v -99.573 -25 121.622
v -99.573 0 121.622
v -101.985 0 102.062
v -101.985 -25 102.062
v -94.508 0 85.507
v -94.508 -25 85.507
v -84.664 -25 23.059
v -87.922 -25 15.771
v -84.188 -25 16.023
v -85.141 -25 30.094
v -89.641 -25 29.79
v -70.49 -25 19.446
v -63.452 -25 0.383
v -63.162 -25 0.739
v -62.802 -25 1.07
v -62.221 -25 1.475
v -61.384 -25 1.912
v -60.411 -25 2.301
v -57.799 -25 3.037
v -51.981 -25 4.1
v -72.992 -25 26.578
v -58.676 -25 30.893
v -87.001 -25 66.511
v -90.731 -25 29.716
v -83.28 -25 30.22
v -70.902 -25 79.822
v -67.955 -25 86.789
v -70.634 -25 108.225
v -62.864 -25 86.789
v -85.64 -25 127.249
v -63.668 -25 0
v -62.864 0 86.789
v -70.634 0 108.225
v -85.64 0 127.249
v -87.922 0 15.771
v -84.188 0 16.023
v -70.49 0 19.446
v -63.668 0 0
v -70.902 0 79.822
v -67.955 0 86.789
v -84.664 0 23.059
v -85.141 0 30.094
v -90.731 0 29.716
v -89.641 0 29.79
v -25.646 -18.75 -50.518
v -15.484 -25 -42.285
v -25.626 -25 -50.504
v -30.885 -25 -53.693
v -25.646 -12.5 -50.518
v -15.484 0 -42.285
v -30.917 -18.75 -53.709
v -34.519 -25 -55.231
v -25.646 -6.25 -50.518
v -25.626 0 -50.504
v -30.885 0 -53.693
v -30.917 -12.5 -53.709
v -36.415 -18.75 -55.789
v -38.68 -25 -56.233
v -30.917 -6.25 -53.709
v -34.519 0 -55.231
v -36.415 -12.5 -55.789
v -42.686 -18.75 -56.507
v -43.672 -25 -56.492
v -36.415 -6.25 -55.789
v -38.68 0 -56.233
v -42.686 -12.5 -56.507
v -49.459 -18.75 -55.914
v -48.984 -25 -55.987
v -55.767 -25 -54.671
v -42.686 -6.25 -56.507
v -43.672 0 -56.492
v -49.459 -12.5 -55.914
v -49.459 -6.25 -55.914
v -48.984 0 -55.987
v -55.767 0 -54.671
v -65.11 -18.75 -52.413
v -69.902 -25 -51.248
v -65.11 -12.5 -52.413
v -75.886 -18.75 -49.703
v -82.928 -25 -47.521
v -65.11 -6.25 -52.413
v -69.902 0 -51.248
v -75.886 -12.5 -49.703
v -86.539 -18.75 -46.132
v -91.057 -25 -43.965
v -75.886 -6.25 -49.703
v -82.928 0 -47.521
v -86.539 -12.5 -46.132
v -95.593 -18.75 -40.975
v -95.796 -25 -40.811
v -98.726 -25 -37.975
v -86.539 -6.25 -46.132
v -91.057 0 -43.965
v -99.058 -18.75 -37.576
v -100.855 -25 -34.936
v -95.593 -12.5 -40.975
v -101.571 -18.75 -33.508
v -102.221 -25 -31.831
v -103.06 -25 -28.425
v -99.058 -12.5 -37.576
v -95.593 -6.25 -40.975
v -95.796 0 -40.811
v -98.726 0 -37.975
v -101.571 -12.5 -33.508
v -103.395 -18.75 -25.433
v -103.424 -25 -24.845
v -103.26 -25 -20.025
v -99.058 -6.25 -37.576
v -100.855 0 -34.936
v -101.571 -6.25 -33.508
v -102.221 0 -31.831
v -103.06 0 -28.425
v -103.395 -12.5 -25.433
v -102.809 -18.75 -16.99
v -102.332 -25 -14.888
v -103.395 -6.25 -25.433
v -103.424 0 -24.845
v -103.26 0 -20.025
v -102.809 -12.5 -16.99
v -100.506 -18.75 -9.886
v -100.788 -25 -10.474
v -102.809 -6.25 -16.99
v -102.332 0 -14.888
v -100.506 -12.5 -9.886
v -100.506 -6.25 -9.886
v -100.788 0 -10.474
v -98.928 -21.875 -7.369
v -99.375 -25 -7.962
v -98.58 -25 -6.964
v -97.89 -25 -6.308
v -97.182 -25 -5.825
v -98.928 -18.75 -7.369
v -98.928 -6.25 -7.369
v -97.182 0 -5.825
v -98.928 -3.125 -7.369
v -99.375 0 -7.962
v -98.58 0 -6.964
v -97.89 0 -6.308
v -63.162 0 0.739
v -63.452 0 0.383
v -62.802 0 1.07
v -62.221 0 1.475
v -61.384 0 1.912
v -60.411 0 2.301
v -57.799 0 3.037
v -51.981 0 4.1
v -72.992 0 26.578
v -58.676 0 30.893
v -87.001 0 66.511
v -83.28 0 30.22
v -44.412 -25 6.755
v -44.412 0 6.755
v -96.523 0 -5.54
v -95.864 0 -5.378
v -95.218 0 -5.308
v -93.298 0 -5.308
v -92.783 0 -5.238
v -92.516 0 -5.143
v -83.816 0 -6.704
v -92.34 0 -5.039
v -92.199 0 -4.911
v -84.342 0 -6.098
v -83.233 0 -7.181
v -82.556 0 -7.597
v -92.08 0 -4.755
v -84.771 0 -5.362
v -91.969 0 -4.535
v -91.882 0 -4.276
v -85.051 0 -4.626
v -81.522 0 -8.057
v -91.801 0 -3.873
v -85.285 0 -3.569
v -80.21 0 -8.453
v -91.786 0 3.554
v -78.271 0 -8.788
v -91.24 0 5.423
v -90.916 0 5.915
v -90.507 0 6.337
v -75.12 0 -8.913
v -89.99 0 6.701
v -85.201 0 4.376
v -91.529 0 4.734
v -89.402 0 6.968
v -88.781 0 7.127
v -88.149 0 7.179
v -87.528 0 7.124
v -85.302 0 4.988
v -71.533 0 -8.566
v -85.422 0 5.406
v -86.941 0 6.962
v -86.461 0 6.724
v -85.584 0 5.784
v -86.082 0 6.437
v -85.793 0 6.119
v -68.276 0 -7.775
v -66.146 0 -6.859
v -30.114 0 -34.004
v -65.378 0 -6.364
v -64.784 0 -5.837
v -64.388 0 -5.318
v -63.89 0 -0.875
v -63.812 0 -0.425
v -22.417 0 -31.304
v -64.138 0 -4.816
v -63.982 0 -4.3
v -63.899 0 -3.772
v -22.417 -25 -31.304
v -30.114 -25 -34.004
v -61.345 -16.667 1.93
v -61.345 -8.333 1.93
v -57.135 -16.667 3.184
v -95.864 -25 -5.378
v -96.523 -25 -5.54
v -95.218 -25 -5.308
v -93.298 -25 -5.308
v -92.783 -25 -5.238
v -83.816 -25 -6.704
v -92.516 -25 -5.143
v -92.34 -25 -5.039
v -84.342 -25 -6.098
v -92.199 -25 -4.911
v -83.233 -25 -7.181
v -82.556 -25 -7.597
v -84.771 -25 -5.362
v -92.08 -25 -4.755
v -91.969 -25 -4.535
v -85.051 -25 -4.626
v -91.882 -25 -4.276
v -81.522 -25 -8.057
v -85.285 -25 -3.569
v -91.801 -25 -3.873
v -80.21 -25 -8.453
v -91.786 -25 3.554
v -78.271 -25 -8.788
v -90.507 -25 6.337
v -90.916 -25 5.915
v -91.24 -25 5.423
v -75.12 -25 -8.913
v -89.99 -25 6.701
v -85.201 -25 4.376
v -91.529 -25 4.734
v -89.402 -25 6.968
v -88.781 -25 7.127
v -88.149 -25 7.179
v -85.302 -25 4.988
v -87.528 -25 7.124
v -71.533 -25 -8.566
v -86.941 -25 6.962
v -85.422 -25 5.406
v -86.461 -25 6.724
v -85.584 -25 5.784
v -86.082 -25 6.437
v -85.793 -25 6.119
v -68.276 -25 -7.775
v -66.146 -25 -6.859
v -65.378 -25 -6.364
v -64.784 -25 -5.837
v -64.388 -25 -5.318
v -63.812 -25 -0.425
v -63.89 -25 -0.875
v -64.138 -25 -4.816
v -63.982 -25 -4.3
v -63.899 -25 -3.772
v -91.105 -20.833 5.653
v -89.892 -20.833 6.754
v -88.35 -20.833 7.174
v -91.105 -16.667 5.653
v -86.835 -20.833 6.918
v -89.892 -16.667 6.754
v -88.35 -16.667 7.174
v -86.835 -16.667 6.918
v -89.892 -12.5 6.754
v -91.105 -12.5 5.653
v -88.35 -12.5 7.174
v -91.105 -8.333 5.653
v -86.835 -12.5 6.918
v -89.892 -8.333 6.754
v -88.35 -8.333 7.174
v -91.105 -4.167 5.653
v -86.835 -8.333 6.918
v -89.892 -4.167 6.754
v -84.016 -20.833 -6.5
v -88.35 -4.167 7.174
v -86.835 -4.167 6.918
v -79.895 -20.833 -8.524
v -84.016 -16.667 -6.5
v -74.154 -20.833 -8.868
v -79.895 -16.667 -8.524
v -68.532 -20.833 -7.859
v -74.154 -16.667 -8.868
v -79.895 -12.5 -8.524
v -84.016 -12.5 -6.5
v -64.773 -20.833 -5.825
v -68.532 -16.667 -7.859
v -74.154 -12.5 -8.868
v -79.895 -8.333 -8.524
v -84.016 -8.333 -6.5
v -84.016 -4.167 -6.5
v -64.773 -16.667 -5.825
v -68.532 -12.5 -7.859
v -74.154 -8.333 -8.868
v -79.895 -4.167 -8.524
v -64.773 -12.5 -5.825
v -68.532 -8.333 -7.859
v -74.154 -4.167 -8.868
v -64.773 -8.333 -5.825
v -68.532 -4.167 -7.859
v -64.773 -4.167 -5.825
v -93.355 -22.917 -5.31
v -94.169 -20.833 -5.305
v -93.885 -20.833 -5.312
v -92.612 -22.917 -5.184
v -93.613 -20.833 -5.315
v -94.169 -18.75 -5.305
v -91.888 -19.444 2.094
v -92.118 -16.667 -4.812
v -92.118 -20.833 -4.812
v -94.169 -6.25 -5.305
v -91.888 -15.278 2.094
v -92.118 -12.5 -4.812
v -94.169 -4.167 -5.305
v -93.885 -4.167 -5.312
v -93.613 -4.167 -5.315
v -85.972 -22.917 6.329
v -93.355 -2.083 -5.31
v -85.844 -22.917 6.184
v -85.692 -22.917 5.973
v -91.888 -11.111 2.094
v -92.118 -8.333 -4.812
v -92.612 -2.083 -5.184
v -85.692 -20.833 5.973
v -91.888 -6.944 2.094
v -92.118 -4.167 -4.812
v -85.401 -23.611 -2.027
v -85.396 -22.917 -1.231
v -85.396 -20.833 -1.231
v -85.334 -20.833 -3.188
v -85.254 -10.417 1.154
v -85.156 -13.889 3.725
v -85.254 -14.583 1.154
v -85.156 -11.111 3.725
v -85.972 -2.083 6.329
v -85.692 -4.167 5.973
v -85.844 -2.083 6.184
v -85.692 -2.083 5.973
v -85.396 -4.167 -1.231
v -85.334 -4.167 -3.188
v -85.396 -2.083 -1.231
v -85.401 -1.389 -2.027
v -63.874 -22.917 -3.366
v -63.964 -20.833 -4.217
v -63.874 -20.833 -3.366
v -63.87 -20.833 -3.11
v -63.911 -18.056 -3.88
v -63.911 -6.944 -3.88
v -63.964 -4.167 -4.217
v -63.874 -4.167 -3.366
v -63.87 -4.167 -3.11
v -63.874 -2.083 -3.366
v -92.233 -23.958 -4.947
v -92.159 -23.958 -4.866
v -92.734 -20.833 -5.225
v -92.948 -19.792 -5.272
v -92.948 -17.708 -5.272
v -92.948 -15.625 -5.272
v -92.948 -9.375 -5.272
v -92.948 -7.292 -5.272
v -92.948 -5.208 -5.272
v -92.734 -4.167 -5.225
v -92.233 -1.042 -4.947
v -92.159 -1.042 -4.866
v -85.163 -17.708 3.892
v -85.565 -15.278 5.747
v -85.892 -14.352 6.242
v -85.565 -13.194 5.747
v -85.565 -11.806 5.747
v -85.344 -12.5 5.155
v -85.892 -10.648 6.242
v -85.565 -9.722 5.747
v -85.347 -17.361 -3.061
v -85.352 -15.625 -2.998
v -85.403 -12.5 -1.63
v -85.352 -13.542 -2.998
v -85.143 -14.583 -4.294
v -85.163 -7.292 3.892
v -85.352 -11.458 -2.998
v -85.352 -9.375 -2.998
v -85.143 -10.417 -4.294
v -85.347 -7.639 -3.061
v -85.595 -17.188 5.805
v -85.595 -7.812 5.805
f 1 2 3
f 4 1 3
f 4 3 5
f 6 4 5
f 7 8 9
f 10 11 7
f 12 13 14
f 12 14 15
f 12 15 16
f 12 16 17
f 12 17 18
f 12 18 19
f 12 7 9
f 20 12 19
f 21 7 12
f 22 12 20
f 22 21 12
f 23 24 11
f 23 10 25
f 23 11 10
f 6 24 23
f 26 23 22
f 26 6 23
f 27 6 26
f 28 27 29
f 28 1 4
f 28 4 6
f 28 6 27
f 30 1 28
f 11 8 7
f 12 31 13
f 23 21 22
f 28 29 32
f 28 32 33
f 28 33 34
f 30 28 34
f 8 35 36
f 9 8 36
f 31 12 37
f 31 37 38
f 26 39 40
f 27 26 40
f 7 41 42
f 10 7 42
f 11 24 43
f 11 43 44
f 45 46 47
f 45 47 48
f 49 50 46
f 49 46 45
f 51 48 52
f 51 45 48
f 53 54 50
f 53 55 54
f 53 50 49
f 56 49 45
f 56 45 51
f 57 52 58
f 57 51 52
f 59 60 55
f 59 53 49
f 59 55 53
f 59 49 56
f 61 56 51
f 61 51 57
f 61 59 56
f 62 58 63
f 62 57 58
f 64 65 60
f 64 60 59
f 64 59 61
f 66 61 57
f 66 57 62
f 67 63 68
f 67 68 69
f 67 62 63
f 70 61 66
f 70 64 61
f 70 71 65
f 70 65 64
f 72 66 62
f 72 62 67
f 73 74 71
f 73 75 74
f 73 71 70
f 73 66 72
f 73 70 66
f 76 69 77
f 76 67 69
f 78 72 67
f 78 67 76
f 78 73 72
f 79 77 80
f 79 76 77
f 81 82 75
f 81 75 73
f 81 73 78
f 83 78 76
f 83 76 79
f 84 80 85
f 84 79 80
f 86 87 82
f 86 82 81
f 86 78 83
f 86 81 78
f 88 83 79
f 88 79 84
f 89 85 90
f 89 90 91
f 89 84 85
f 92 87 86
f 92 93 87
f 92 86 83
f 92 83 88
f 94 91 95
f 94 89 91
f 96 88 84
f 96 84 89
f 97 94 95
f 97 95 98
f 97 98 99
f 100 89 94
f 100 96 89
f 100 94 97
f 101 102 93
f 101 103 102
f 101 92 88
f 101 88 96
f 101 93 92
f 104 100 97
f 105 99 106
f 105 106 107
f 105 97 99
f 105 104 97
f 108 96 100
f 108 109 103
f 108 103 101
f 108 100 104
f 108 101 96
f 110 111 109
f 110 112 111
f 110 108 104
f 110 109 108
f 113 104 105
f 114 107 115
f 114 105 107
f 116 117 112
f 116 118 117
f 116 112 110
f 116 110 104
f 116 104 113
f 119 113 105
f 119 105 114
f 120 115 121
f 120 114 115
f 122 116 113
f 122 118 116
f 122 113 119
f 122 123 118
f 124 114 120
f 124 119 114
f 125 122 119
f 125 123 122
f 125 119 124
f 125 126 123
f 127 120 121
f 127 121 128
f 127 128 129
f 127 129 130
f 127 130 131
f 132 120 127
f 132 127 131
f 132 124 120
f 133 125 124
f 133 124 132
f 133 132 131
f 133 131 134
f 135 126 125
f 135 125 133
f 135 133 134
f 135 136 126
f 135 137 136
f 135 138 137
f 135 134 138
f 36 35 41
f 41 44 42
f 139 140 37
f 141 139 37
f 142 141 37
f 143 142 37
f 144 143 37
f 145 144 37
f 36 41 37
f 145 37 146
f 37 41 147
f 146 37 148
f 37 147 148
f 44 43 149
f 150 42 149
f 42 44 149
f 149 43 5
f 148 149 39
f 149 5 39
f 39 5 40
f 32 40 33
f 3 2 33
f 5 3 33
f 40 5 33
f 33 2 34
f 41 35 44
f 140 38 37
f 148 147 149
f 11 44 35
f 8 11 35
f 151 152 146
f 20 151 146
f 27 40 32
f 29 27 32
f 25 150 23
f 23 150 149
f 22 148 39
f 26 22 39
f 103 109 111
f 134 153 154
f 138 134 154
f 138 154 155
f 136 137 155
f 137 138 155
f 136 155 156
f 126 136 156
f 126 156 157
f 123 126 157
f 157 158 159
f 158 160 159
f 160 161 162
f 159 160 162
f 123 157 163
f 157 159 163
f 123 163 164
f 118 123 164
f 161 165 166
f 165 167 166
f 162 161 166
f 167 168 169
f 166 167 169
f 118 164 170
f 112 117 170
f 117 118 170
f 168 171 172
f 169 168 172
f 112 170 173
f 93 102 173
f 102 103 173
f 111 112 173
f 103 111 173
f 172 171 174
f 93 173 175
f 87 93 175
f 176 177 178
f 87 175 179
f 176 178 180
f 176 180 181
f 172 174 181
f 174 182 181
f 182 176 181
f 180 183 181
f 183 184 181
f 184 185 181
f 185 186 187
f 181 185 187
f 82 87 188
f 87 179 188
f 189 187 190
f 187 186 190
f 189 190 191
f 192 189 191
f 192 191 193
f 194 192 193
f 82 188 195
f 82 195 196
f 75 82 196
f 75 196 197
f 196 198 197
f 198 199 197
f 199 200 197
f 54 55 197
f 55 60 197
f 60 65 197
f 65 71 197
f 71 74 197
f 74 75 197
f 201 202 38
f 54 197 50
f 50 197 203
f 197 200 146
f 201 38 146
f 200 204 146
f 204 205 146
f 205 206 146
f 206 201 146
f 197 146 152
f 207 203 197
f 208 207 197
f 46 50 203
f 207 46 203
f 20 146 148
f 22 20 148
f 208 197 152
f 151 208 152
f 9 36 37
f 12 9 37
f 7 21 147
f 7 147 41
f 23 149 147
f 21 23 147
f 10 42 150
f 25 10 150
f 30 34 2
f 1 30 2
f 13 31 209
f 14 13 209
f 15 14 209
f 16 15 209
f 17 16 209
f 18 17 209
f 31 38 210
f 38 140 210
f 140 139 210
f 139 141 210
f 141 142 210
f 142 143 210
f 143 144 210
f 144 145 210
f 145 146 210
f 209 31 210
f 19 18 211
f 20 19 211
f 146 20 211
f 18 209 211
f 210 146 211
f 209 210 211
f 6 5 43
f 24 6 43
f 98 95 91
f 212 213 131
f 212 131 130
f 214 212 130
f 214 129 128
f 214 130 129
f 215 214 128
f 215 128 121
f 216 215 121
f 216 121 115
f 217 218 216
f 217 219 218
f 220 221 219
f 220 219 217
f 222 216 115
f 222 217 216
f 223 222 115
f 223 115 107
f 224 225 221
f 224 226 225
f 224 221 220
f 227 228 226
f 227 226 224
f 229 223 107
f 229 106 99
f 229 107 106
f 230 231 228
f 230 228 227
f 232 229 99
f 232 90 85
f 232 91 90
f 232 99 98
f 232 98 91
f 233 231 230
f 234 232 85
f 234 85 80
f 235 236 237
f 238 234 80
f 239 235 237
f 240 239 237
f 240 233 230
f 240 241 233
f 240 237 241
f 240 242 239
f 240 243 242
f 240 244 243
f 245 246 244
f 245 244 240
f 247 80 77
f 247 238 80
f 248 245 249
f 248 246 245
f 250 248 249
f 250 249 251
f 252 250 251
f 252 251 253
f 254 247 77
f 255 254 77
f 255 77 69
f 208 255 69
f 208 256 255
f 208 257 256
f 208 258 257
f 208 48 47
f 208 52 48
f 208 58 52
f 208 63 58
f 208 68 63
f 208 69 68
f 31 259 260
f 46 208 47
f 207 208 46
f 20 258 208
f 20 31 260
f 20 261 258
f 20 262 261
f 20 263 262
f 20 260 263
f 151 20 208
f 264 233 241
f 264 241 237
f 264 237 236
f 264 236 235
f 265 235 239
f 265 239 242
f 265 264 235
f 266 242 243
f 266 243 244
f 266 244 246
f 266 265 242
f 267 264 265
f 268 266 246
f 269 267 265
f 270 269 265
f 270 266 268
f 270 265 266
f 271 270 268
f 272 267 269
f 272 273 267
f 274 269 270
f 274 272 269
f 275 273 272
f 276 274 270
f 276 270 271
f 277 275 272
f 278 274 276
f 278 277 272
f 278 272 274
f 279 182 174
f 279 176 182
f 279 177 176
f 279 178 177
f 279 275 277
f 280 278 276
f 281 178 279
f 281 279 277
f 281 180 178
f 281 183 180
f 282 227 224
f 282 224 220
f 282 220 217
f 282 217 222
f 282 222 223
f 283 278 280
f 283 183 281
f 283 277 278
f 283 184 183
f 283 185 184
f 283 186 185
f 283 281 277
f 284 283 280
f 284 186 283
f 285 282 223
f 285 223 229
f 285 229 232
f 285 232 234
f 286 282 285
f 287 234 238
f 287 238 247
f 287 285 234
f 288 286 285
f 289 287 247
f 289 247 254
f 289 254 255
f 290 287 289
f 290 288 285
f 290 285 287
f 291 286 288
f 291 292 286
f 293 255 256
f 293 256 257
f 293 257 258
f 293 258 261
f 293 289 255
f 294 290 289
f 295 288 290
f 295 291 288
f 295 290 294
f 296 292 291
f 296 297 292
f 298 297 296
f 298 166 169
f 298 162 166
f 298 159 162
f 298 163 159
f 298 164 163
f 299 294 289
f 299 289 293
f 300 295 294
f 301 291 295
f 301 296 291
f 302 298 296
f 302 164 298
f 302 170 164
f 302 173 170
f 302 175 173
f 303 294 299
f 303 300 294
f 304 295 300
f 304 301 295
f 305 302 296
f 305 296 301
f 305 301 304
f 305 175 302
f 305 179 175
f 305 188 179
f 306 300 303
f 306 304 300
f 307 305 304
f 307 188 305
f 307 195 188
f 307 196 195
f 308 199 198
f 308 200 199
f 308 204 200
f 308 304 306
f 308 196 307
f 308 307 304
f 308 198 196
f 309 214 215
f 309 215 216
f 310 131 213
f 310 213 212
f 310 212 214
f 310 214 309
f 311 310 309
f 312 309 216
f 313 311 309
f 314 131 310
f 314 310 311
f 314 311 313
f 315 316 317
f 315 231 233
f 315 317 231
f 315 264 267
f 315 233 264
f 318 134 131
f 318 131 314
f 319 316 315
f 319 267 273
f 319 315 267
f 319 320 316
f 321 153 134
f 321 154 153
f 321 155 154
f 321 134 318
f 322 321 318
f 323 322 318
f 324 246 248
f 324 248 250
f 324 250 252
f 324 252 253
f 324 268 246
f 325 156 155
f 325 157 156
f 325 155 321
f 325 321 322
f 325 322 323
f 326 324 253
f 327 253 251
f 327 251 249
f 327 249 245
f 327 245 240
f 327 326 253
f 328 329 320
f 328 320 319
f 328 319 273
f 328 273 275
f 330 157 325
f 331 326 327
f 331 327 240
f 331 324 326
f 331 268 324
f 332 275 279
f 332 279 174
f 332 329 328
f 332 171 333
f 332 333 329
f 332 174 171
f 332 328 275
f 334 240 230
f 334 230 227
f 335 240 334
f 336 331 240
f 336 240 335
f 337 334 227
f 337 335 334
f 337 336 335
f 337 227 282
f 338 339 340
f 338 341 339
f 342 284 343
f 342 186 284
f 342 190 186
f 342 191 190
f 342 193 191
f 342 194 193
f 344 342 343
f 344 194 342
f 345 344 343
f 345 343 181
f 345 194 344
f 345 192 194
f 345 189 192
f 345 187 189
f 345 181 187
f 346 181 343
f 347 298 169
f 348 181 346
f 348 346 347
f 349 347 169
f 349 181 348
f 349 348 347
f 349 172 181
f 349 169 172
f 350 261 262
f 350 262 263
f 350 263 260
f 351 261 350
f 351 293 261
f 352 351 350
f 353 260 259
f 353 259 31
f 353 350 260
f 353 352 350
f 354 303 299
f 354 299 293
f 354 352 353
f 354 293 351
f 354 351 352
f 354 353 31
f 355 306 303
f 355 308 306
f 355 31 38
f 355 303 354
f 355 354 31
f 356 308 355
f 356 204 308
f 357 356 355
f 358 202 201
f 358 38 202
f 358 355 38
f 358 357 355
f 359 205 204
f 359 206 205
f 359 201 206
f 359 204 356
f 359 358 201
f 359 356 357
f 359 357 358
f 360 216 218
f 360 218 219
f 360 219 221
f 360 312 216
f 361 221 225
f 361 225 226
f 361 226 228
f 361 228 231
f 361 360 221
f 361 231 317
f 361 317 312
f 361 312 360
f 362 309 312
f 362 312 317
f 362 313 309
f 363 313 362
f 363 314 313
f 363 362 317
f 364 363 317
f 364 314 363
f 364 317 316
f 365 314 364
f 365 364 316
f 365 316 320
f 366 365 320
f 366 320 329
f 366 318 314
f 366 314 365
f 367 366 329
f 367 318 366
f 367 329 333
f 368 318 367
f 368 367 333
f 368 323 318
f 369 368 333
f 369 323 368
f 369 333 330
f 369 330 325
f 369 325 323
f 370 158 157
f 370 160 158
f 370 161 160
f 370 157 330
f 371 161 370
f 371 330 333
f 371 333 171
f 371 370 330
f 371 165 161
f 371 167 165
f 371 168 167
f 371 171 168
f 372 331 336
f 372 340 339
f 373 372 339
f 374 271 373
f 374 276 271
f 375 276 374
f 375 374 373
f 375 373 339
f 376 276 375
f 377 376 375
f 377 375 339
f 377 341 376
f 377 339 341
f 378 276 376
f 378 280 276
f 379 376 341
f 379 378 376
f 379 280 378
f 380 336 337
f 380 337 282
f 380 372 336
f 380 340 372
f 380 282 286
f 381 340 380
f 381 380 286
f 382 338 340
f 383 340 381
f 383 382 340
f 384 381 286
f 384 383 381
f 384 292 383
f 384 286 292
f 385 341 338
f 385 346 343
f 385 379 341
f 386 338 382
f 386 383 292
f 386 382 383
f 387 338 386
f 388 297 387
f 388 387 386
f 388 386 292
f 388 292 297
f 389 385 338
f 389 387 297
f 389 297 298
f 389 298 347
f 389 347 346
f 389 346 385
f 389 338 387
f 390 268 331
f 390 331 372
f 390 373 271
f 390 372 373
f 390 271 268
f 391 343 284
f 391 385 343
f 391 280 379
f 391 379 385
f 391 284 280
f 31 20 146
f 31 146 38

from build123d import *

# Parameters (mm, degrees)
F1_DEPTH = 25


with BuildPart() as f1:
    # F0 (on Front) → F1 (new body)
    with BuildSketch(Plane.XZ):
        Polygon((-67.9549872875, 86.7890566587), (-62.8639534116, 86.7890566587), (-70.6344842911, 108.2249954343), (-85.6396406889, 127.2493898869), (-99.5730012655, 121.6224655509), (-101.9845455885, 102.0621657372), (-94.5079061411, 85.5067434539), (-90.7306820154, 77.1428868175), (-87.0009771891, 66.5113421182), (-72.9916559629, 26.5776927393), (-58.6763904546, 30.8931585449), (-70.9024295211, 79.8223763704), align=None)
        with BuildLine():
            Line((-51.9814671391, 4.0997416872), (-56.6784390995, 22.8972576218))
            Line((-56.6784390995, 22.8972576218), (-70.4898154089, 19.4461820921))
            Line((-70.4898154089, 19.4461820921), (-63.6678040028, 0))
            add(Edge.make_bspline(
                [(-63.6678040028, 0), (-62.6025917878, 2.3804234755), (-57.2920294634, 3.2400825813), (-51.9814671391, 4.0997416872)],
                knots=[0.9196587211, 0.9196587211, 0.9196587211, 0.9196587211, 1, 1, 1, 1], degree=3))
        make_face()
        Polygon((-56.6784390995, 22.8972576218), (-58.6763904546, 30.8931585449), (-72.9916559629, 26.5776927393), (-70.4898154089, 19.4461820921), align=None)
        Polygon((-70.4898154089, 19.4461820921), (-72.9916559629, 26.5776927393), (-84.6643581719, 23.0588514567), (-84.1880339892, 16.0233815049), align=None)
        Polygon((-84.1880339892, 16.0233815049), (-84.6643581719, 23.0588514567), (-85.1406823546, 30.0943214084), (-89.6410877635, 29.7896293348), (-87.9223760767, 15.7705544081), align=None)
        Polygon((-90.7306820154, 77.1428868175), (-94.5079061411, 85.5067434539), (-90.7306820154, 29.7158602625), (-89.6410877635, 29.7896293348), (-85.1406823546, 30.0943214084), (-83.2803875202, 30.2202694151), (-87.0009771891, 66.5113421182), align=None)
    extrude(amount=F1_DEPTH)


with BuildPart() as f1b:
    # F0 (on Front) → F1, piece 2 (new body)
    with BuildSketch(Plane.XZ):
        with BuildLine():
            Line((-44.4123115357, 6.7551146348), (-51.9814671391, 4.0997416872))
            Line((-51.9814671391, 4.0997416872), (-63.6678040028, 0))
            add(Edge.make_bspline(
                [(-84.0157642961, -6.5002837218), (-80.3769619279, -10.4653968659), (-60.7750428984, -8.3022644313), (-64.4048344433, -1.6470375932), (-63.6678040028, 0)],
                knots=[0.7638931488, 0.7638931488, 0.7638931488, 0.7638931488, 0.8640698278, 0.9196587211, 0.9196587211, 0.9196587211, 0.9196587211], degree=3))
            add(Edge.make_bspline(
                [(-97.1819683909, -5.825097207), (-95.1198455048, -4.6972104323), (-89.7261550482, -7.6222241395), (-94.1425307007, 7.441139246), (-82.1160368265, 7.8220231405), (-86.9598682661, -3.2921662788), (-84.0157642961, -6.5002837218)],
                knots=[0.5038246097, 0.5038246097, 0.5038246097, 0.5038246097, 0.5557045571, 0.6297312992, 0.6828416026, 0.7638931488, 0.7638931488, 0.7638931488, 0.7638931488], degree=3))
            add(Edge.make_bspline(
                [(-15.4839940369, -42.28534922), (-22.1916599811, -48.1028908047), (-36.1235931602, -60.1860209572), (-64.3084642847, -52.1724356442), (-110.6817429492, -42.2526482756), (-101.986076631, -8.4527243891), (-97.1819683909, -5.825097207)],
                knots=[0, 0, 0, 0, 0.1139397427, 0.2366547313, 0.3829603855, 0.5038246097, 0.5038246097, 0.5038246097, 0.5038246097], degree=3))
            Line((-15.4839940369, -42.28534922), (-22.417053889, -31.303501404))
            Line((-22.417053889, -31.303501404), (-30.1135620818, -34.003551544))
            Line((-30.1135620818, -34.003551544), (-44.4123115357, 6.7551146348))
        make_face()
    extrude(amount=F1_DEPTH)


solid = Compound([f1.part, f1b.part])
